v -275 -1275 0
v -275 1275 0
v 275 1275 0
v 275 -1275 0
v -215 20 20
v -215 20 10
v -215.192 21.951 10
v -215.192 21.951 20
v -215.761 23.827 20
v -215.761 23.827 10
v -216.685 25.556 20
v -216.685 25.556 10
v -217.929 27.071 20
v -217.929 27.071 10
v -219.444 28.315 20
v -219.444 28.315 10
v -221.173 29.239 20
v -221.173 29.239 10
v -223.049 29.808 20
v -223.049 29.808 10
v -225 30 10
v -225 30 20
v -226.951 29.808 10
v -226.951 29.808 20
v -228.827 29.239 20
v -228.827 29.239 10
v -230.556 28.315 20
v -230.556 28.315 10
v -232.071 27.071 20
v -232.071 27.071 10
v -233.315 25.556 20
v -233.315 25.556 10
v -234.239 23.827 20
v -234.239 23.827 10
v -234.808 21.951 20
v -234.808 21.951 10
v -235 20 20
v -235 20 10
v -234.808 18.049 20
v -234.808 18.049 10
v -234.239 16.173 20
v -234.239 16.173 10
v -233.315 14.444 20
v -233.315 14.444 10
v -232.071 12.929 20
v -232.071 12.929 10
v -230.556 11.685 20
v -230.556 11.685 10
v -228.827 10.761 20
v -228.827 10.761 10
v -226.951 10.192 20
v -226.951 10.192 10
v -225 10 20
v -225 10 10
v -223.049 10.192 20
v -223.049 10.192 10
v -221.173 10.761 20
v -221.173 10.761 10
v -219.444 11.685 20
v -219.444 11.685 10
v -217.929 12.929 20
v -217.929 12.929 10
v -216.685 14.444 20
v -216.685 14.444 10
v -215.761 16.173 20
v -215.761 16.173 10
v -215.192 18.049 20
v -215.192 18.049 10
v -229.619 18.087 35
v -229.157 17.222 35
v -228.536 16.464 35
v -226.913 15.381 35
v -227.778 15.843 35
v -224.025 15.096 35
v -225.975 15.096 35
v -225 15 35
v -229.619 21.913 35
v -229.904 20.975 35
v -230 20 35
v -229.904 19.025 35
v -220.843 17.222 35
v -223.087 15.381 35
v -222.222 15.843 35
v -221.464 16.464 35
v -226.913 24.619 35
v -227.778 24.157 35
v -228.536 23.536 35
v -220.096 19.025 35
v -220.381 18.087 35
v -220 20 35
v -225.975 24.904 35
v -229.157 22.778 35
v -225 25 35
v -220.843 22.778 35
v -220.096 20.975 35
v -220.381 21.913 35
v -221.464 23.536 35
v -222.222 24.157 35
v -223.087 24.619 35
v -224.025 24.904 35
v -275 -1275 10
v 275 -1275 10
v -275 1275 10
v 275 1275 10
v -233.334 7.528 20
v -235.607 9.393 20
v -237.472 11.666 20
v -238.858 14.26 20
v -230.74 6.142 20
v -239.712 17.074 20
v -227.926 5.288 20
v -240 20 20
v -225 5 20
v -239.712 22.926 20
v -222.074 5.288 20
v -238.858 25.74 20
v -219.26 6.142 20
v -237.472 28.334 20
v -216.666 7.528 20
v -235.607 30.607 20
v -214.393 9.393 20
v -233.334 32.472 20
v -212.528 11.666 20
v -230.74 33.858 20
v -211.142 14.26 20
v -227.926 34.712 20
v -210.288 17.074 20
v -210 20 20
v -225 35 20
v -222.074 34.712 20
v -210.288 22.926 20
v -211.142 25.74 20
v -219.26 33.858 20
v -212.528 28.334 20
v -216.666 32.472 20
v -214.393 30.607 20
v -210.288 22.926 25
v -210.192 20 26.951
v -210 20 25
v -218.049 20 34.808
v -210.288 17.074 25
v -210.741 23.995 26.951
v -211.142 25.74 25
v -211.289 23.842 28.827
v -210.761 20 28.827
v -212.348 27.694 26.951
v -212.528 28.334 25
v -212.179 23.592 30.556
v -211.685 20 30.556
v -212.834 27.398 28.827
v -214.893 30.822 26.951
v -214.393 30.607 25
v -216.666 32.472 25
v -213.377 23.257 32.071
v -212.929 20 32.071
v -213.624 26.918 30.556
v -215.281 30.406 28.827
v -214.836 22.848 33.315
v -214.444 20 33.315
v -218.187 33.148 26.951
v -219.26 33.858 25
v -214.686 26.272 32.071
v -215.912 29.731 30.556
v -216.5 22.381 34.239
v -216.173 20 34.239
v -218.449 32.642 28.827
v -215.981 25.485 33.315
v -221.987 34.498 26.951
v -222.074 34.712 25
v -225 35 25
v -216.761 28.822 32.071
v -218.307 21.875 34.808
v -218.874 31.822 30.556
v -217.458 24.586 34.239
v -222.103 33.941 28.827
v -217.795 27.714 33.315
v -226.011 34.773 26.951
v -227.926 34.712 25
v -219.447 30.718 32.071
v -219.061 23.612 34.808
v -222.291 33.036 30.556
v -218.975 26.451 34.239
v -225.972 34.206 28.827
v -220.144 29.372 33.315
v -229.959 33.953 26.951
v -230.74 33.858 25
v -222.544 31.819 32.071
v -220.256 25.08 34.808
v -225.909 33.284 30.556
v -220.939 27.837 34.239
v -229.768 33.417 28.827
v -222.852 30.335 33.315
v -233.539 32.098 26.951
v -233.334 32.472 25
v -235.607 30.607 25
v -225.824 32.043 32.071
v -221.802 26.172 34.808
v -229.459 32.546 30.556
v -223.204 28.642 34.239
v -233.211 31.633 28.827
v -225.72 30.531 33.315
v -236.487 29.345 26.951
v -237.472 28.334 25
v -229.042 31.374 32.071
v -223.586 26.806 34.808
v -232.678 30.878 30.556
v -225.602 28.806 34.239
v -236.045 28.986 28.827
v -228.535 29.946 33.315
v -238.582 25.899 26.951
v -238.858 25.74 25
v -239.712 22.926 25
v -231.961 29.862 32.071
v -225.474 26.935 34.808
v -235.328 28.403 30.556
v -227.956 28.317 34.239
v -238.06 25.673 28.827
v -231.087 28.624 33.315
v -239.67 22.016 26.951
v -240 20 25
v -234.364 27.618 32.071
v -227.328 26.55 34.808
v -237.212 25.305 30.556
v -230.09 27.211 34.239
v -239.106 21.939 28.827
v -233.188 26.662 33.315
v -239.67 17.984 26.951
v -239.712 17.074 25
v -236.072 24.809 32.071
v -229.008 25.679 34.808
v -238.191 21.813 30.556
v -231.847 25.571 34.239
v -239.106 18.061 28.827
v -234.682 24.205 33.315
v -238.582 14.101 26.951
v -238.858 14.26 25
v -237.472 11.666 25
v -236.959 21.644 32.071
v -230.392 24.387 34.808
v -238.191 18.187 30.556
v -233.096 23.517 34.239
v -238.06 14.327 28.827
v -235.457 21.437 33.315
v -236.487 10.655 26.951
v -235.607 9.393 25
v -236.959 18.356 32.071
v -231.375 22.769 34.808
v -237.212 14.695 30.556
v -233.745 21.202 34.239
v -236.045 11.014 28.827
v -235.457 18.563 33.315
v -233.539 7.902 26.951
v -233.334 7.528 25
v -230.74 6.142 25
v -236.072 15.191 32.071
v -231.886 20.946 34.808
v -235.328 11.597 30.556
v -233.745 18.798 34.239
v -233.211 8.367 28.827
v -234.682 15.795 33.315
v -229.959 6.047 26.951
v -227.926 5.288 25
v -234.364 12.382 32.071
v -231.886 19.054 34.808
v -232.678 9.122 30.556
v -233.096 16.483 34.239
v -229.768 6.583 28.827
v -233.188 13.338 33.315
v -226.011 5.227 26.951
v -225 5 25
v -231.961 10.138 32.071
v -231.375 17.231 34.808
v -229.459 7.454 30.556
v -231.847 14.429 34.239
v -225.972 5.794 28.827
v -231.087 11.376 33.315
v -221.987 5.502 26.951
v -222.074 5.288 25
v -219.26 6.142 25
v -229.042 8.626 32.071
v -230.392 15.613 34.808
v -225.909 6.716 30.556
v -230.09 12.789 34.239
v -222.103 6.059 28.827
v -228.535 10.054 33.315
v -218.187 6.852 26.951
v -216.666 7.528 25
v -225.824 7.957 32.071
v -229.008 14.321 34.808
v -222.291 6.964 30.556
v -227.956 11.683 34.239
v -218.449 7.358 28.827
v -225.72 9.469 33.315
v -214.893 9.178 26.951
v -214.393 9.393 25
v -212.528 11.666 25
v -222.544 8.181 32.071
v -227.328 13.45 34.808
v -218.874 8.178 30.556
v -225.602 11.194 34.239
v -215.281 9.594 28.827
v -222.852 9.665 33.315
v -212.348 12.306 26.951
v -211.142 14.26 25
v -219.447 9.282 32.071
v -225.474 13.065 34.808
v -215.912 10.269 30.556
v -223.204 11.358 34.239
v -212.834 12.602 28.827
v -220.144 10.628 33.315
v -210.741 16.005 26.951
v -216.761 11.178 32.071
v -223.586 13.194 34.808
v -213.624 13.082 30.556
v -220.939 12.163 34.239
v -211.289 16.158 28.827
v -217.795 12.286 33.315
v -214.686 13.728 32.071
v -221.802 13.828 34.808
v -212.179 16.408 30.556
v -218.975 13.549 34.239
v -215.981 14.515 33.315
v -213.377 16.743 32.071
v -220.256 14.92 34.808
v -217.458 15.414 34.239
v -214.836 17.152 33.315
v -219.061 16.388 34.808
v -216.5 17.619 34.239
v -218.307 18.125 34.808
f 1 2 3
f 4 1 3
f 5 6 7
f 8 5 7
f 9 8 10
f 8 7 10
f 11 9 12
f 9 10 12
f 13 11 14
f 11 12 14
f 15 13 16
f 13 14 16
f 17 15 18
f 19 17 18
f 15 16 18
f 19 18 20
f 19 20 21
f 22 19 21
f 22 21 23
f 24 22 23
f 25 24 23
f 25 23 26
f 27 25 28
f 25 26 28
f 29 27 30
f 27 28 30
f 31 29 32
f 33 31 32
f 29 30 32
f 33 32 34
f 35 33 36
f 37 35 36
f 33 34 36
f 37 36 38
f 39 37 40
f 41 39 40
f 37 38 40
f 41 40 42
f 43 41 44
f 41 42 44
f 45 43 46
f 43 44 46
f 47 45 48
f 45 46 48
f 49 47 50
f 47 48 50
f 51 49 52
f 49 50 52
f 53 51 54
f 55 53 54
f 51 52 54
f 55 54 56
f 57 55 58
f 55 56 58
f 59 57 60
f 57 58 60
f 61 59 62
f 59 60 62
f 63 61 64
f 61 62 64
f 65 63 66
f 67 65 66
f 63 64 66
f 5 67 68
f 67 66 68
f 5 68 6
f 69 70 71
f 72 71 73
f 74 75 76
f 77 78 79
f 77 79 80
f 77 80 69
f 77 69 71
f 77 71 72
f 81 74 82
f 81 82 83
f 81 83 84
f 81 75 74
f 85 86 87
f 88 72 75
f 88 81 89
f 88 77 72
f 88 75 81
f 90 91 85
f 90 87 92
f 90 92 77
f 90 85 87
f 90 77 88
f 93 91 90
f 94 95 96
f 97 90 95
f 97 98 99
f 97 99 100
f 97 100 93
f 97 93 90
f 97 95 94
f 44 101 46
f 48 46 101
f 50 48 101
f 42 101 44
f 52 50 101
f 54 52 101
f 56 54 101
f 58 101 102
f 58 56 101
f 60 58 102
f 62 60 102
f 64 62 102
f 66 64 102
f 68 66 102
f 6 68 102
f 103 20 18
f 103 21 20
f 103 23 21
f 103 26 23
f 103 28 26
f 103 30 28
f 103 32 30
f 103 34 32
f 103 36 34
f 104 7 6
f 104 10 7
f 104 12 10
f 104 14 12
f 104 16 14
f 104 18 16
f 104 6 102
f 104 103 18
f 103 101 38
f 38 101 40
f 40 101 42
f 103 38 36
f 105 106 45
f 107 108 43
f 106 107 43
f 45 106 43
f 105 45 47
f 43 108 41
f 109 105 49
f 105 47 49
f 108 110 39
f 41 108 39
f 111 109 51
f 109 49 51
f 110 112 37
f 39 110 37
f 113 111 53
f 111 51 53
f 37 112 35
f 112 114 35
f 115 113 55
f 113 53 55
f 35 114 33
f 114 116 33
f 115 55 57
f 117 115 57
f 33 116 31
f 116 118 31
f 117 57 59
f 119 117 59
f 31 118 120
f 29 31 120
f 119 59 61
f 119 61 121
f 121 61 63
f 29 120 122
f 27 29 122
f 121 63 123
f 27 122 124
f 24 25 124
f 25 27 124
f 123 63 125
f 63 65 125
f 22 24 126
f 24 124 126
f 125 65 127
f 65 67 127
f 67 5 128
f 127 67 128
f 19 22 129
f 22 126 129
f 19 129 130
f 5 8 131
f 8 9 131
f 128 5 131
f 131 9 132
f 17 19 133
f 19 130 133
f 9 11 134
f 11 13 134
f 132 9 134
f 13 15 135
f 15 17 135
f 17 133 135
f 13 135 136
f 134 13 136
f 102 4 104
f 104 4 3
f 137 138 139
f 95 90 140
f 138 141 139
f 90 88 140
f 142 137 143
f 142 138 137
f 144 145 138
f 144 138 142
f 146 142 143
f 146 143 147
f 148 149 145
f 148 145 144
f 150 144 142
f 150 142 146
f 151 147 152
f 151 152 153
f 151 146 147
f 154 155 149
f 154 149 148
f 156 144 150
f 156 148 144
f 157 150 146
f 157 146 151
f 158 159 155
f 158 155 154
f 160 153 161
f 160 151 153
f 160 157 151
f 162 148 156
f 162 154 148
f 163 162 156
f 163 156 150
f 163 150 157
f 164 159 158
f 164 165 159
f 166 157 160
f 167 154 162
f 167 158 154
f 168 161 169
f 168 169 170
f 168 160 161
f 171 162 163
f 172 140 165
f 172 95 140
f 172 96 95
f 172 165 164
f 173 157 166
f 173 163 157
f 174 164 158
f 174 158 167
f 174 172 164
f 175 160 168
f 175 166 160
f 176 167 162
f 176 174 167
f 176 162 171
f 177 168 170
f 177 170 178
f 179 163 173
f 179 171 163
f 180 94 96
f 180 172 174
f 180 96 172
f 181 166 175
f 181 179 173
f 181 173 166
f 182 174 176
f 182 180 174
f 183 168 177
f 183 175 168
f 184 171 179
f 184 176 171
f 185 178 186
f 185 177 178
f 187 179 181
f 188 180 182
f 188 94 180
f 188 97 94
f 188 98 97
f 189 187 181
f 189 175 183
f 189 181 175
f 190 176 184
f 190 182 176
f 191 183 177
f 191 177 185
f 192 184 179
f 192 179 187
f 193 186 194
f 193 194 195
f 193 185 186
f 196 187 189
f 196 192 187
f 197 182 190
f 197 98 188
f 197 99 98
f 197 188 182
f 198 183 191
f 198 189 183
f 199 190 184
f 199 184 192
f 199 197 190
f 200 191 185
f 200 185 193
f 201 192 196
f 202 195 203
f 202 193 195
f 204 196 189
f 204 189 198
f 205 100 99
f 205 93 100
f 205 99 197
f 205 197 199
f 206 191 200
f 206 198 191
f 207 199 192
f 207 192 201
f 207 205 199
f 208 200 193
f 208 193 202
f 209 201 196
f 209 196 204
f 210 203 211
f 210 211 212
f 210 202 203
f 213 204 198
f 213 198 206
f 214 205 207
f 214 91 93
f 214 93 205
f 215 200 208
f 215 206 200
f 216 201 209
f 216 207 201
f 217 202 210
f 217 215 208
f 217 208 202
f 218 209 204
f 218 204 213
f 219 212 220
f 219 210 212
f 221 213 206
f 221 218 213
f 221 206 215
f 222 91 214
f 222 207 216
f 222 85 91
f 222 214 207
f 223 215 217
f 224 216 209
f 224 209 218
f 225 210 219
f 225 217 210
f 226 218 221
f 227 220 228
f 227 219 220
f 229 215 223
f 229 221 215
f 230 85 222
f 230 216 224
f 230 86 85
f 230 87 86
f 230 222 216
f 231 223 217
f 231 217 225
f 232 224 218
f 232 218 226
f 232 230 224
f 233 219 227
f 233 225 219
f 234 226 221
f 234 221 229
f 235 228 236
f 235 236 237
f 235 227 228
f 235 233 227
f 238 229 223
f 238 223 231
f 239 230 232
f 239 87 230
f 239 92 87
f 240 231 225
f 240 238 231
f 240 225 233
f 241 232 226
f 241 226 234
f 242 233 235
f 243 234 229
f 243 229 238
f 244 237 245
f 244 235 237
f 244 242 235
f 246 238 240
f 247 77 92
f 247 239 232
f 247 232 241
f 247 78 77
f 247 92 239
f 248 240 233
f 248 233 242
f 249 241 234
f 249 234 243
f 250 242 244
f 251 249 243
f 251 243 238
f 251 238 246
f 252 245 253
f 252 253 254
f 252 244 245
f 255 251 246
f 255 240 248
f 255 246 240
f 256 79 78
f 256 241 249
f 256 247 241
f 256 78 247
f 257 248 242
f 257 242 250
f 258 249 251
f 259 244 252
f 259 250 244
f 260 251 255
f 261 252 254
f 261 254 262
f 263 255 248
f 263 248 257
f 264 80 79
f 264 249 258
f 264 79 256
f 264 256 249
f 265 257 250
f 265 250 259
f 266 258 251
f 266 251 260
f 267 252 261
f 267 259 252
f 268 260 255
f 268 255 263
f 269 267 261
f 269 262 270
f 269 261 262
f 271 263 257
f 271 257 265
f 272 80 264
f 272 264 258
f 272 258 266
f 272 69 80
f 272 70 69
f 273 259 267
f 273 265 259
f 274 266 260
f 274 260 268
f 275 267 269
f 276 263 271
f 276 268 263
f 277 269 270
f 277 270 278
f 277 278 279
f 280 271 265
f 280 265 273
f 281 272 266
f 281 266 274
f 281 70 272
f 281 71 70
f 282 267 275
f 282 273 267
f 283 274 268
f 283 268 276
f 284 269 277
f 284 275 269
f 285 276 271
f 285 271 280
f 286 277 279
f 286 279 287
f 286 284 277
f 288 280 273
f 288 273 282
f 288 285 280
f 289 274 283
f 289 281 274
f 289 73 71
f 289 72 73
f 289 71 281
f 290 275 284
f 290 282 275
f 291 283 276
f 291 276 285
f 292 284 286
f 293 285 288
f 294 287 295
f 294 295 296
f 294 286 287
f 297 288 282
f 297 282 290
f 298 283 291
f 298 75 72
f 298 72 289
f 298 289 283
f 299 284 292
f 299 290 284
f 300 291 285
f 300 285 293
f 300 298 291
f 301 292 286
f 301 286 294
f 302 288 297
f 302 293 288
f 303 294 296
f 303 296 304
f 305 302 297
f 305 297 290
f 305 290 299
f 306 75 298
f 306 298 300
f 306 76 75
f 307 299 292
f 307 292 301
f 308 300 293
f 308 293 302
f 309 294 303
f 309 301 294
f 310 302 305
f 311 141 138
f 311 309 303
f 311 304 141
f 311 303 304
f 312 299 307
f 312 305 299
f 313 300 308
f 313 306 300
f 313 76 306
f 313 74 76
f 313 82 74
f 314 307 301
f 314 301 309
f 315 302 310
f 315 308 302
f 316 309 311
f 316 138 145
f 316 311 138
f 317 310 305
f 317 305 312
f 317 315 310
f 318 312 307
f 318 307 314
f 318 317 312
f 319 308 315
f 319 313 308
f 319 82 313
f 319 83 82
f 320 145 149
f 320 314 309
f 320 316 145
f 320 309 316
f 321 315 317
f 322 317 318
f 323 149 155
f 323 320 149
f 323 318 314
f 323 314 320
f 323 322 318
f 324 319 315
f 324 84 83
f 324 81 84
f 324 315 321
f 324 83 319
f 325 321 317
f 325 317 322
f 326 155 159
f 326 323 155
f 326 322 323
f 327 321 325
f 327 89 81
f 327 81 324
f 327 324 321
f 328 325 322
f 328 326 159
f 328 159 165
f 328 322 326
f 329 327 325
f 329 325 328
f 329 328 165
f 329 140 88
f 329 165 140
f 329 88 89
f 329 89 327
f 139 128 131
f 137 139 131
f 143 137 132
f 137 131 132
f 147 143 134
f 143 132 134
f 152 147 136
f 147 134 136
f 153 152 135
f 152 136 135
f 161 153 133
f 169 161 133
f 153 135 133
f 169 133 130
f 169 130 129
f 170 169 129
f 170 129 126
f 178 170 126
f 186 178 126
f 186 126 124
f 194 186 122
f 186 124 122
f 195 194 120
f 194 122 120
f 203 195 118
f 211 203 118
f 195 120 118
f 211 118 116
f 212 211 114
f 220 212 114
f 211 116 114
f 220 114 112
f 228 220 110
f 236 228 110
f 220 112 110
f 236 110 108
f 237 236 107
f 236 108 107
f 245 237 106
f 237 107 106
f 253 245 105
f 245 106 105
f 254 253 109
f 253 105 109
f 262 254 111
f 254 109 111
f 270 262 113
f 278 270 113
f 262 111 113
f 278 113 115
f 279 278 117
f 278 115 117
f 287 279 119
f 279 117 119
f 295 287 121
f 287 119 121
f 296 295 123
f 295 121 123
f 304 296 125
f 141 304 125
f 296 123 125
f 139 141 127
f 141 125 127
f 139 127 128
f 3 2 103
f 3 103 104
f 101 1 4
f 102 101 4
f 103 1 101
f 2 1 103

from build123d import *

# Parameters (mm, degrees)
SKETCH1_W           = 550
SKETCH1_H           = 2550
BOSS_EXTRUDE1_DEPTH = 10
SKETCH2_R           = 10
BOSS_EXTRUDE2_DEPTH = 10
SKETCH3_R           = 15
BOSS_EXTRUDE3_DEPTH = 15
FILLET1_R           = 10


with BuildPart() as part:
    # Sketch1 → Boss-Extrude1 (new body)
    with BuildSketch(Plane.XY):
        Rectangle(SKETCH1_W, SKETCH1_H)
    extrude(amount=BOSS_EXTRUDE1_DEPTH)

    # Sketch2 → Boss-Extrude2 (add)
    with BuildSketch(Plane.XY.offset(10)):
        with Locations((-225, 20)):
            Circle(SKETCH2_R)
    extrude(amount=BOSS_EXTRUDE2_DEPTH)

    # Sketch3 → Boss-Extrude3 (add)
    with BuildSketch(Plane.XY.offset(20)):
        with Locations((-225, 20)):
            Circle(SKETCH3_R)
    extrude(amount=BOSS_EXTRUDE3_DEPTH)

    # Fillet1
    fillet1_edges = [part.edges().sort_by_distance(p)[0] for p in [
        (-240, 20, 35),
    ]]
    fillet(fillet1_edges, radius=FILLET1_R)


solid = part.part
